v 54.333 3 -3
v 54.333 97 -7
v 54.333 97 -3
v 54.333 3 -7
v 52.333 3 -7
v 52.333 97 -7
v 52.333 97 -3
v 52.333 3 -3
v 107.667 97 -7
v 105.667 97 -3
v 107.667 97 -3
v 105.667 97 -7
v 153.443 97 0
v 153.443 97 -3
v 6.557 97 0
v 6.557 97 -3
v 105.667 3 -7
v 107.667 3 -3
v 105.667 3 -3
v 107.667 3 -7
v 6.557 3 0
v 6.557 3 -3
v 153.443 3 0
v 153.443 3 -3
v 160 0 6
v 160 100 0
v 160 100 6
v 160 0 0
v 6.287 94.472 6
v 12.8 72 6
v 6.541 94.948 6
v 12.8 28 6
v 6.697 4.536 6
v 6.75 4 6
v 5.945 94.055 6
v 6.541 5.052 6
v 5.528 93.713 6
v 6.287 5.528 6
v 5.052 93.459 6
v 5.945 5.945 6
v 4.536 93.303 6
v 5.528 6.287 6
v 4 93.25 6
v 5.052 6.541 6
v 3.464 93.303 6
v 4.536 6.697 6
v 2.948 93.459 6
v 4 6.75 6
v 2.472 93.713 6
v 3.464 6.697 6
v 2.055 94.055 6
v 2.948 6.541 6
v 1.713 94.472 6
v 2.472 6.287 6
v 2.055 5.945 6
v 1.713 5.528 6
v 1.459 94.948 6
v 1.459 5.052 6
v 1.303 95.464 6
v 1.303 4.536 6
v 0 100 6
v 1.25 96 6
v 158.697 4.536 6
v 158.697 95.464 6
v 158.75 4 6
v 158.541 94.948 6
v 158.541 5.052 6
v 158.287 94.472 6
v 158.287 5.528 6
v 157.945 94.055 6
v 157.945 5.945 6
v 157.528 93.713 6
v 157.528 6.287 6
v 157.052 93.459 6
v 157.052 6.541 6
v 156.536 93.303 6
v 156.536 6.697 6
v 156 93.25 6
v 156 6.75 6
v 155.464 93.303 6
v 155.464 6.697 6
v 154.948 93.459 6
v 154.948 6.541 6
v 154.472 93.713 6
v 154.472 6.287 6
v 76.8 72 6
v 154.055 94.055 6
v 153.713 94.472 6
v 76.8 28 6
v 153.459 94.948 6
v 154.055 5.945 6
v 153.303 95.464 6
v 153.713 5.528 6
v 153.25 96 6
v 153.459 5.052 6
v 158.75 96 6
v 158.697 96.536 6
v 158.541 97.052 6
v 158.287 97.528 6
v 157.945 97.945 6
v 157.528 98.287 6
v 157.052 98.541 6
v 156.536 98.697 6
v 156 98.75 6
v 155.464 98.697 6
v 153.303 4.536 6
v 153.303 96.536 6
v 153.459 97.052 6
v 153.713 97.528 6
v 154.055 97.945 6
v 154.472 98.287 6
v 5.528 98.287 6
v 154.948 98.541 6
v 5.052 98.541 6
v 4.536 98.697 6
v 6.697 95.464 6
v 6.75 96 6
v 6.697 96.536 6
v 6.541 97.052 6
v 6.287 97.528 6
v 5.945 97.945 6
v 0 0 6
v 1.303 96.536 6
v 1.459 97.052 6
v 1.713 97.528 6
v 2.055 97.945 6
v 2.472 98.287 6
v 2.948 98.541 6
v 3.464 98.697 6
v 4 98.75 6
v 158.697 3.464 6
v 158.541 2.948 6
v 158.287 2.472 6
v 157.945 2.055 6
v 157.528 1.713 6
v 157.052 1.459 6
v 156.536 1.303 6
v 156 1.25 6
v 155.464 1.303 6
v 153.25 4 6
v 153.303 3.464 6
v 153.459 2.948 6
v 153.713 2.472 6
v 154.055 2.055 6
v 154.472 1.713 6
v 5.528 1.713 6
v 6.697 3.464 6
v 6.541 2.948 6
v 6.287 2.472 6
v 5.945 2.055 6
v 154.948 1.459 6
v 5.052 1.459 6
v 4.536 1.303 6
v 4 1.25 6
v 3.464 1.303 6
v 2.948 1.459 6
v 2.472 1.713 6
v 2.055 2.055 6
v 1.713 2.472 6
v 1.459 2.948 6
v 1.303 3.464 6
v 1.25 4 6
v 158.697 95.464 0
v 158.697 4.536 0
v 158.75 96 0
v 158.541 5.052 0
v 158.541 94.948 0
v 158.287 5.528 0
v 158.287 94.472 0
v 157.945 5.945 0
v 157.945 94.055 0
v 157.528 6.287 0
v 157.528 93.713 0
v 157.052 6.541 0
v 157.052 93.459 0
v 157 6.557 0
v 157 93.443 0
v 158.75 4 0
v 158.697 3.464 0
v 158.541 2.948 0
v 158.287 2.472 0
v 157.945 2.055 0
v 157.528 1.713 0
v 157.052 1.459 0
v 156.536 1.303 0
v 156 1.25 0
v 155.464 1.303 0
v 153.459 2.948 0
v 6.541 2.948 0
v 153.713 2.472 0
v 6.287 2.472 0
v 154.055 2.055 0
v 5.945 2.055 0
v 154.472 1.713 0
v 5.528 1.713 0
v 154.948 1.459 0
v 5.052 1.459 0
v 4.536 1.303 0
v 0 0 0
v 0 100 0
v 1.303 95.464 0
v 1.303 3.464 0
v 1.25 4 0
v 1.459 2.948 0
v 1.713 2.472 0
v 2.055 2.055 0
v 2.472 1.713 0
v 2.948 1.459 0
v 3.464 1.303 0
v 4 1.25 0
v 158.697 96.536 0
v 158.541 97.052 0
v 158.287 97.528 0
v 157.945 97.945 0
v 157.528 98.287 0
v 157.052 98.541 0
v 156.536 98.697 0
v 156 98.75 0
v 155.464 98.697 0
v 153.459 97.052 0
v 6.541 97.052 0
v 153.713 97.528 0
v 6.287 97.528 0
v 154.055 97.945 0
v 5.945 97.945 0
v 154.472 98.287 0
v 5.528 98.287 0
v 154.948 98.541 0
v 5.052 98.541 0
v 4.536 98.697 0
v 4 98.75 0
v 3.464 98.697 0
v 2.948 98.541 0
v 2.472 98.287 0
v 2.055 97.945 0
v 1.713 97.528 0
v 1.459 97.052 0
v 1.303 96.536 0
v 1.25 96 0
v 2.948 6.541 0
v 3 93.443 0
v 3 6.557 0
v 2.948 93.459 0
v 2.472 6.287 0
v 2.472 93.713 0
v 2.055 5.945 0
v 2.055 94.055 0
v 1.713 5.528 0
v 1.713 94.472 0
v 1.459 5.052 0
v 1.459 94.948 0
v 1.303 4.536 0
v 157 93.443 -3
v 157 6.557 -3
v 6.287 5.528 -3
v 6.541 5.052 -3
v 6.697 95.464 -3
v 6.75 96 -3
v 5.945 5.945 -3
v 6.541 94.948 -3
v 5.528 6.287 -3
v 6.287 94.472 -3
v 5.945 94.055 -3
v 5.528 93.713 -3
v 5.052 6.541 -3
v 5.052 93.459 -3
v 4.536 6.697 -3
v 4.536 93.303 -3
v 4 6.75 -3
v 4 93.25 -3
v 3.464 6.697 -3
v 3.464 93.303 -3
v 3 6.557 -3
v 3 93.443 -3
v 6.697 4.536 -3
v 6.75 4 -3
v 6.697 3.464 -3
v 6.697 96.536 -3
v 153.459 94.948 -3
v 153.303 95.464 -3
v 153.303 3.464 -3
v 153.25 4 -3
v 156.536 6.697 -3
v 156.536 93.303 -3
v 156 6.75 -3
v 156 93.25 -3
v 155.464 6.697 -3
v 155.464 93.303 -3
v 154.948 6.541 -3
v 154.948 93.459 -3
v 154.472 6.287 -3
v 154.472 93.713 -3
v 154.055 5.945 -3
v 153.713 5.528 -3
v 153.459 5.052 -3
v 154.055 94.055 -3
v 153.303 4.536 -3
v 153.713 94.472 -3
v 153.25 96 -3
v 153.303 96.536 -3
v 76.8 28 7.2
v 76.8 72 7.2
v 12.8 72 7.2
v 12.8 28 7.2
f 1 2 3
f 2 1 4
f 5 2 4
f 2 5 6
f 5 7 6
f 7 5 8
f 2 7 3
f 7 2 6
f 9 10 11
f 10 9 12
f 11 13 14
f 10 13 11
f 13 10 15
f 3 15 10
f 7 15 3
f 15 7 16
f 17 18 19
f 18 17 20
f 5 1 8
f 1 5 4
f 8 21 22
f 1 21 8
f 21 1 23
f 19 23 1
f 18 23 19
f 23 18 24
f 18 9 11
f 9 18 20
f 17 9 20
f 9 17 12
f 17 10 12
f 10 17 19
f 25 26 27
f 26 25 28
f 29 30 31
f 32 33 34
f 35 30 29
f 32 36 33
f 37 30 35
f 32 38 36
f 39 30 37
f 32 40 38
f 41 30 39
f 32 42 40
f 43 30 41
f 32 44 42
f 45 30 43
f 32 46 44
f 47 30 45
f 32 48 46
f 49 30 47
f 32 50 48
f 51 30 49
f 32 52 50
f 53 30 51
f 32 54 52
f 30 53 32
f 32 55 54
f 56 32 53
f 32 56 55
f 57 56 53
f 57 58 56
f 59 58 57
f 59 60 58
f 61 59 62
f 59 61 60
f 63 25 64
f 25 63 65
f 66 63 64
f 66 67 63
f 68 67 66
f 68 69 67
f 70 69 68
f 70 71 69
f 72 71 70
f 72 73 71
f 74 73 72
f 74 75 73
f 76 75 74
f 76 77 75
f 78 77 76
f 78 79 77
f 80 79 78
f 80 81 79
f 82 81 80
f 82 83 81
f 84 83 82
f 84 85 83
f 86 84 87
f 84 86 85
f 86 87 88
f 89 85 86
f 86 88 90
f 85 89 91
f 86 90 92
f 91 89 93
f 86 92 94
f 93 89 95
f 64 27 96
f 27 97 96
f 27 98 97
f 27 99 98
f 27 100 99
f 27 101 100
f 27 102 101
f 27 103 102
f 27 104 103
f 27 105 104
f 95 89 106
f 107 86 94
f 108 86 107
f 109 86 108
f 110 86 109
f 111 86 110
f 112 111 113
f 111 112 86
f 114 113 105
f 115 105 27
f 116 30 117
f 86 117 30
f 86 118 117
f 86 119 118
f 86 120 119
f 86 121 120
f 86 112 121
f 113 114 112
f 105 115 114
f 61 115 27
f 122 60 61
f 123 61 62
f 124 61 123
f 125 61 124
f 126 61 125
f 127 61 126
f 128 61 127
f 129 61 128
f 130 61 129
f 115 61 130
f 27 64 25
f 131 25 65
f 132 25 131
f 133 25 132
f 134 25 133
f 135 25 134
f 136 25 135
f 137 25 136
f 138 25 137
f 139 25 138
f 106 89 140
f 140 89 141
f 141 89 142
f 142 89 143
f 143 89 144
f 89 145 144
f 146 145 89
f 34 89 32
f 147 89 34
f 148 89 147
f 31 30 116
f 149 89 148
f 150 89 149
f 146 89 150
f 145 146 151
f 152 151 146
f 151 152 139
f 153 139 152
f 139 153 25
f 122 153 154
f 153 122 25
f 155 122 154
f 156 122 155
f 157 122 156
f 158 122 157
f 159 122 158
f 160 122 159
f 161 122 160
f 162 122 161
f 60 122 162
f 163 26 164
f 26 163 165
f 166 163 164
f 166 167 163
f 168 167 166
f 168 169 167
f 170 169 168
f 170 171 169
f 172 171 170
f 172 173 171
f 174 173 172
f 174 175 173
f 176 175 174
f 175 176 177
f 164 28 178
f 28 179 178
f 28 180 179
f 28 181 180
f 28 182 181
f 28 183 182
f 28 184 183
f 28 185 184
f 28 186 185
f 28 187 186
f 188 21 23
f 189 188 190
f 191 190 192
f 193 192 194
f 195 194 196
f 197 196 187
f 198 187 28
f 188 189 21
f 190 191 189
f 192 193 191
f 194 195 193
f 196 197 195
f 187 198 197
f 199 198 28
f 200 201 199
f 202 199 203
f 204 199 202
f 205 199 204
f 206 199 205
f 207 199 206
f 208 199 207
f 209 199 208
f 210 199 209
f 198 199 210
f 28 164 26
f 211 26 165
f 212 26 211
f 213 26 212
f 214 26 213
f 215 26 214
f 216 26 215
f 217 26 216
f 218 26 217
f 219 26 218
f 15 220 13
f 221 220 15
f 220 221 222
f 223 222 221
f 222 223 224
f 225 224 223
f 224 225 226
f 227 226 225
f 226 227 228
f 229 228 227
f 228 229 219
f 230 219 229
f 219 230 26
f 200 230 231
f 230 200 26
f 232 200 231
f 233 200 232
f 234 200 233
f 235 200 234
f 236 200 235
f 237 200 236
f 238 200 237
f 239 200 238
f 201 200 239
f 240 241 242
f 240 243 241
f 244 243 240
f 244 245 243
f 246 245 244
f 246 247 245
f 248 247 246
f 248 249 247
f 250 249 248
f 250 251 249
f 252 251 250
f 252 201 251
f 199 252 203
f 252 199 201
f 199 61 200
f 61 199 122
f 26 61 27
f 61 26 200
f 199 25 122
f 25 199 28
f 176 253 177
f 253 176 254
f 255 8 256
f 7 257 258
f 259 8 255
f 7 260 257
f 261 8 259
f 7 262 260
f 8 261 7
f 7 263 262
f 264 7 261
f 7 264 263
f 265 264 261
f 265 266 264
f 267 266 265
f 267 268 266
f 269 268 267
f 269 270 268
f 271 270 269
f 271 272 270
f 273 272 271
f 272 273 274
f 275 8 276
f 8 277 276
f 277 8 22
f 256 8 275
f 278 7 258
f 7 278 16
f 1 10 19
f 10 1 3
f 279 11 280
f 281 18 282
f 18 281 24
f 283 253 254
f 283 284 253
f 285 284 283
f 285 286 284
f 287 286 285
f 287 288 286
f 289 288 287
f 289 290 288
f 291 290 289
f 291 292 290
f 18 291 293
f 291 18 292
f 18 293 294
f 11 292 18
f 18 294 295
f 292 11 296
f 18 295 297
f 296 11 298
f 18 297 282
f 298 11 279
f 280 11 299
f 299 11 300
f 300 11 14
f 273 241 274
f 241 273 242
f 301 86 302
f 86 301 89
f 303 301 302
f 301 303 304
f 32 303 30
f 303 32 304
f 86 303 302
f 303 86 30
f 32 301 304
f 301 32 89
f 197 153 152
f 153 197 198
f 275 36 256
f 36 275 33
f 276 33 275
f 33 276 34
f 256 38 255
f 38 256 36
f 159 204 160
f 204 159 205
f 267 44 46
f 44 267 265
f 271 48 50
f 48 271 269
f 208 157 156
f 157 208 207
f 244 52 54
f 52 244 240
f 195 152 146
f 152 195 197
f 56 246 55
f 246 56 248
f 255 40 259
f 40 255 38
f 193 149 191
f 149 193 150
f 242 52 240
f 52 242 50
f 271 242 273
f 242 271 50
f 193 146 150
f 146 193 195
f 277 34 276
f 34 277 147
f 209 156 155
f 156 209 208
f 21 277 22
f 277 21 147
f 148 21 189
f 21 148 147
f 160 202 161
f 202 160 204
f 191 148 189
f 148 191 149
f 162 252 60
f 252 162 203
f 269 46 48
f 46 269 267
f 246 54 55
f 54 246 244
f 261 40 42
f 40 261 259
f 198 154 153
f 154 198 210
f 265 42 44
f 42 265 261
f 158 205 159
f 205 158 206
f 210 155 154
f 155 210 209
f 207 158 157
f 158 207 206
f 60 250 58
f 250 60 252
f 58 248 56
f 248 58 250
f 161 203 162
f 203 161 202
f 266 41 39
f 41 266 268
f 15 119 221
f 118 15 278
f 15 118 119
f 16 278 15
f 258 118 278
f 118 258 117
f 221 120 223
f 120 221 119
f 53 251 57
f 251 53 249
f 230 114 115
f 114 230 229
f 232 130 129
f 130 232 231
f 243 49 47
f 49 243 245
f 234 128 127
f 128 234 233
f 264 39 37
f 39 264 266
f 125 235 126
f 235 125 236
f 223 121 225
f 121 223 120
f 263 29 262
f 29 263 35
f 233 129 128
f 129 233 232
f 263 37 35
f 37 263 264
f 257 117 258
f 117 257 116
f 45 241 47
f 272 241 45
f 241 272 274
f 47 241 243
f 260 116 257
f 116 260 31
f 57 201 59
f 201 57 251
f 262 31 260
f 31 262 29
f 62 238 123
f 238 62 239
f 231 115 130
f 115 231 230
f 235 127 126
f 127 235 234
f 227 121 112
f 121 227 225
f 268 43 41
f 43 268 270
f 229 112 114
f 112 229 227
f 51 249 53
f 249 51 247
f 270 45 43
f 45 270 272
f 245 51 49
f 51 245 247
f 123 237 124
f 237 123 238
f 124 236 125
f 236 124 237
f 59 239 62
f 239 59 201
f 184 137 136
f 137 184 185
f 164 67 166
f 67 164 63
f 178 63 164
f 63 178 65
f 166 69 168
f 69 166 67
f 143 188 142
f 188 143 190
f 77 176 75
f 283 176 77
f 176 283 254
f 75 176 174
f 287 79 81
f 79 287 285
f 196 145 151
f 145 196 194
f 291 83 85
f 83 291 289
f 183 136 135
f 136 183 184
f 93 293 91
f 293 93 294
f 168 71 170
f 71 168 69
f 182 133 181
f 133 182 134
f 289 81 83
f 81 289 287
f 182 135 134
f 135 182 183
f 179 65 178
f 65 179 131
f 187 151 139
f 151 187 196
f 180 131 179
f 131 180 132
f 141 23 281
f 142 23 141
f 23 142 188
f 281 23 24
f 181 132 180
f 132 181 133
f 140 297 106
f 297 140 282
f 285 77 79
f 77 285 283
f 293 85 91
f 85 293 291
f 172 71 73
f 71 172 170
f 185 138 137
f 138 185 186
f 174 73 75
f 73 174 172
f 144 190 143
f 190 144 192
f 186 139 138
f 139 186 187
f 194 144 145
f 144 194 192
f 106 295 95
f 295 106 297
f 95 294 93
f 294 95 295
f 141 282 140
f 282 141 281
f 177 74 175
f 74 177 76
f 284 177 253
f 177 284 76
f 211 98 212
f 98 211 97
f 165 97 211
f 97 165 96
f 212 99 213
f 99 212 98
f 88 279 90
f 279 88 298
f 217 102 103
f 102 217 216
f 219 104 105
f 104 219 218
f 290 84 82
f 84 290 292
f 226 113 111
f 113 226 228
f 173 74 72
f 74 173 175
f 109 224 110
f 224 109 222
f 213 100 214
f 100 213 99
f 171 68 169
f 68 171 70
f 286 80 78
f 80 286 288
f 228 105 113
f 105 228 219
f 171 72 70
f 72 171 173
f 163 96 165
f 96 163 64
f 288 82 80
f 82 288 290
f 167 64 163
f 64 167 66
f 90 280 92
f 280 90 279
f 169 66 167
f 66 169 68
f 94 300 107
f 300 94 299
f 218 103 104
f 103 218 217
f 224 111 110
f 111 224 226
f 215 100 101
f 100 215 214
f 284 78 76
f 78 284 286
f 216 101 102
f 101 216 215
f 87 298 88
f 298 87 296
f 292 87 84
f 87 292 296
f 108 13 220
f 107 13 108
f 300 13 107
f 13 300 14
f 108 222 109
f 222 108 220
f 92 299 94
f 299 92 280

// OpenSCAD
$fn = 32;

// ----------------------------------------------------------------------
// Enclosure lid: 160 x 100 x 6 mm, 4 bolt holes
// ----------------------------------------------------------------------

// --- parameters (mm) ---
length = 160;             // lid length, X
width = 100;              // lid width, Y
plate_t = 6;              // lid plate thickness
bolt_d = 5.5;             // bolt clearance
boss_lip = 4;             // bolt hole inset from the corner
sink = 1;                 // overlap of the lip and ribs into the plate
lip_h = 4;                // lip height below the plate
lip_wall = 3;             // lip wall thickness
rib_n = 2;                // stiffening ribs
rib_t = 2;                // rib thickness
rib_h = 8;                // rib height below the plate
label_h = 1.2;            // raised marking pad

module plate() {
  cube([length, width, plate_t]);
  /* lip that drops into the housing opening, sunk into the plate */
  translate([lip_wall, lip_wall, -lip_h + sink]) cube([length - 2 * lip_wall, width - 2 * lip_wall, lip_h]);
  /* stiffening ribs under the plate */
  for (i = [1 : rib_n]) translate([length * i / (rib_n + 1) - rib_t / 2, lip_wall, -rib_h + sink]) cube([rib_t, width - 2 * lip_wall, rib_h]);
  /* raised marking pad on top, sunk 1 mm into the plate */
  translate([length * 0.08, width * 0.28, plate_t - 1]) cube([length * 0.4, width * 0.44, label_h + 1]);
}

difference() {
  plate();
  /* bolt pattern matching the corner bosses */
  for (sx = [0, 1]) for (sy = [0, 1])
    translate([sx * (length - 2 * boss_lip) + boss_lip, sy * (width - 2 * boss_lip) + boss_lip, -lip_h - 1])
      cylinder(h = plate_t + lip_h + 2, d = bolt_d);
}
